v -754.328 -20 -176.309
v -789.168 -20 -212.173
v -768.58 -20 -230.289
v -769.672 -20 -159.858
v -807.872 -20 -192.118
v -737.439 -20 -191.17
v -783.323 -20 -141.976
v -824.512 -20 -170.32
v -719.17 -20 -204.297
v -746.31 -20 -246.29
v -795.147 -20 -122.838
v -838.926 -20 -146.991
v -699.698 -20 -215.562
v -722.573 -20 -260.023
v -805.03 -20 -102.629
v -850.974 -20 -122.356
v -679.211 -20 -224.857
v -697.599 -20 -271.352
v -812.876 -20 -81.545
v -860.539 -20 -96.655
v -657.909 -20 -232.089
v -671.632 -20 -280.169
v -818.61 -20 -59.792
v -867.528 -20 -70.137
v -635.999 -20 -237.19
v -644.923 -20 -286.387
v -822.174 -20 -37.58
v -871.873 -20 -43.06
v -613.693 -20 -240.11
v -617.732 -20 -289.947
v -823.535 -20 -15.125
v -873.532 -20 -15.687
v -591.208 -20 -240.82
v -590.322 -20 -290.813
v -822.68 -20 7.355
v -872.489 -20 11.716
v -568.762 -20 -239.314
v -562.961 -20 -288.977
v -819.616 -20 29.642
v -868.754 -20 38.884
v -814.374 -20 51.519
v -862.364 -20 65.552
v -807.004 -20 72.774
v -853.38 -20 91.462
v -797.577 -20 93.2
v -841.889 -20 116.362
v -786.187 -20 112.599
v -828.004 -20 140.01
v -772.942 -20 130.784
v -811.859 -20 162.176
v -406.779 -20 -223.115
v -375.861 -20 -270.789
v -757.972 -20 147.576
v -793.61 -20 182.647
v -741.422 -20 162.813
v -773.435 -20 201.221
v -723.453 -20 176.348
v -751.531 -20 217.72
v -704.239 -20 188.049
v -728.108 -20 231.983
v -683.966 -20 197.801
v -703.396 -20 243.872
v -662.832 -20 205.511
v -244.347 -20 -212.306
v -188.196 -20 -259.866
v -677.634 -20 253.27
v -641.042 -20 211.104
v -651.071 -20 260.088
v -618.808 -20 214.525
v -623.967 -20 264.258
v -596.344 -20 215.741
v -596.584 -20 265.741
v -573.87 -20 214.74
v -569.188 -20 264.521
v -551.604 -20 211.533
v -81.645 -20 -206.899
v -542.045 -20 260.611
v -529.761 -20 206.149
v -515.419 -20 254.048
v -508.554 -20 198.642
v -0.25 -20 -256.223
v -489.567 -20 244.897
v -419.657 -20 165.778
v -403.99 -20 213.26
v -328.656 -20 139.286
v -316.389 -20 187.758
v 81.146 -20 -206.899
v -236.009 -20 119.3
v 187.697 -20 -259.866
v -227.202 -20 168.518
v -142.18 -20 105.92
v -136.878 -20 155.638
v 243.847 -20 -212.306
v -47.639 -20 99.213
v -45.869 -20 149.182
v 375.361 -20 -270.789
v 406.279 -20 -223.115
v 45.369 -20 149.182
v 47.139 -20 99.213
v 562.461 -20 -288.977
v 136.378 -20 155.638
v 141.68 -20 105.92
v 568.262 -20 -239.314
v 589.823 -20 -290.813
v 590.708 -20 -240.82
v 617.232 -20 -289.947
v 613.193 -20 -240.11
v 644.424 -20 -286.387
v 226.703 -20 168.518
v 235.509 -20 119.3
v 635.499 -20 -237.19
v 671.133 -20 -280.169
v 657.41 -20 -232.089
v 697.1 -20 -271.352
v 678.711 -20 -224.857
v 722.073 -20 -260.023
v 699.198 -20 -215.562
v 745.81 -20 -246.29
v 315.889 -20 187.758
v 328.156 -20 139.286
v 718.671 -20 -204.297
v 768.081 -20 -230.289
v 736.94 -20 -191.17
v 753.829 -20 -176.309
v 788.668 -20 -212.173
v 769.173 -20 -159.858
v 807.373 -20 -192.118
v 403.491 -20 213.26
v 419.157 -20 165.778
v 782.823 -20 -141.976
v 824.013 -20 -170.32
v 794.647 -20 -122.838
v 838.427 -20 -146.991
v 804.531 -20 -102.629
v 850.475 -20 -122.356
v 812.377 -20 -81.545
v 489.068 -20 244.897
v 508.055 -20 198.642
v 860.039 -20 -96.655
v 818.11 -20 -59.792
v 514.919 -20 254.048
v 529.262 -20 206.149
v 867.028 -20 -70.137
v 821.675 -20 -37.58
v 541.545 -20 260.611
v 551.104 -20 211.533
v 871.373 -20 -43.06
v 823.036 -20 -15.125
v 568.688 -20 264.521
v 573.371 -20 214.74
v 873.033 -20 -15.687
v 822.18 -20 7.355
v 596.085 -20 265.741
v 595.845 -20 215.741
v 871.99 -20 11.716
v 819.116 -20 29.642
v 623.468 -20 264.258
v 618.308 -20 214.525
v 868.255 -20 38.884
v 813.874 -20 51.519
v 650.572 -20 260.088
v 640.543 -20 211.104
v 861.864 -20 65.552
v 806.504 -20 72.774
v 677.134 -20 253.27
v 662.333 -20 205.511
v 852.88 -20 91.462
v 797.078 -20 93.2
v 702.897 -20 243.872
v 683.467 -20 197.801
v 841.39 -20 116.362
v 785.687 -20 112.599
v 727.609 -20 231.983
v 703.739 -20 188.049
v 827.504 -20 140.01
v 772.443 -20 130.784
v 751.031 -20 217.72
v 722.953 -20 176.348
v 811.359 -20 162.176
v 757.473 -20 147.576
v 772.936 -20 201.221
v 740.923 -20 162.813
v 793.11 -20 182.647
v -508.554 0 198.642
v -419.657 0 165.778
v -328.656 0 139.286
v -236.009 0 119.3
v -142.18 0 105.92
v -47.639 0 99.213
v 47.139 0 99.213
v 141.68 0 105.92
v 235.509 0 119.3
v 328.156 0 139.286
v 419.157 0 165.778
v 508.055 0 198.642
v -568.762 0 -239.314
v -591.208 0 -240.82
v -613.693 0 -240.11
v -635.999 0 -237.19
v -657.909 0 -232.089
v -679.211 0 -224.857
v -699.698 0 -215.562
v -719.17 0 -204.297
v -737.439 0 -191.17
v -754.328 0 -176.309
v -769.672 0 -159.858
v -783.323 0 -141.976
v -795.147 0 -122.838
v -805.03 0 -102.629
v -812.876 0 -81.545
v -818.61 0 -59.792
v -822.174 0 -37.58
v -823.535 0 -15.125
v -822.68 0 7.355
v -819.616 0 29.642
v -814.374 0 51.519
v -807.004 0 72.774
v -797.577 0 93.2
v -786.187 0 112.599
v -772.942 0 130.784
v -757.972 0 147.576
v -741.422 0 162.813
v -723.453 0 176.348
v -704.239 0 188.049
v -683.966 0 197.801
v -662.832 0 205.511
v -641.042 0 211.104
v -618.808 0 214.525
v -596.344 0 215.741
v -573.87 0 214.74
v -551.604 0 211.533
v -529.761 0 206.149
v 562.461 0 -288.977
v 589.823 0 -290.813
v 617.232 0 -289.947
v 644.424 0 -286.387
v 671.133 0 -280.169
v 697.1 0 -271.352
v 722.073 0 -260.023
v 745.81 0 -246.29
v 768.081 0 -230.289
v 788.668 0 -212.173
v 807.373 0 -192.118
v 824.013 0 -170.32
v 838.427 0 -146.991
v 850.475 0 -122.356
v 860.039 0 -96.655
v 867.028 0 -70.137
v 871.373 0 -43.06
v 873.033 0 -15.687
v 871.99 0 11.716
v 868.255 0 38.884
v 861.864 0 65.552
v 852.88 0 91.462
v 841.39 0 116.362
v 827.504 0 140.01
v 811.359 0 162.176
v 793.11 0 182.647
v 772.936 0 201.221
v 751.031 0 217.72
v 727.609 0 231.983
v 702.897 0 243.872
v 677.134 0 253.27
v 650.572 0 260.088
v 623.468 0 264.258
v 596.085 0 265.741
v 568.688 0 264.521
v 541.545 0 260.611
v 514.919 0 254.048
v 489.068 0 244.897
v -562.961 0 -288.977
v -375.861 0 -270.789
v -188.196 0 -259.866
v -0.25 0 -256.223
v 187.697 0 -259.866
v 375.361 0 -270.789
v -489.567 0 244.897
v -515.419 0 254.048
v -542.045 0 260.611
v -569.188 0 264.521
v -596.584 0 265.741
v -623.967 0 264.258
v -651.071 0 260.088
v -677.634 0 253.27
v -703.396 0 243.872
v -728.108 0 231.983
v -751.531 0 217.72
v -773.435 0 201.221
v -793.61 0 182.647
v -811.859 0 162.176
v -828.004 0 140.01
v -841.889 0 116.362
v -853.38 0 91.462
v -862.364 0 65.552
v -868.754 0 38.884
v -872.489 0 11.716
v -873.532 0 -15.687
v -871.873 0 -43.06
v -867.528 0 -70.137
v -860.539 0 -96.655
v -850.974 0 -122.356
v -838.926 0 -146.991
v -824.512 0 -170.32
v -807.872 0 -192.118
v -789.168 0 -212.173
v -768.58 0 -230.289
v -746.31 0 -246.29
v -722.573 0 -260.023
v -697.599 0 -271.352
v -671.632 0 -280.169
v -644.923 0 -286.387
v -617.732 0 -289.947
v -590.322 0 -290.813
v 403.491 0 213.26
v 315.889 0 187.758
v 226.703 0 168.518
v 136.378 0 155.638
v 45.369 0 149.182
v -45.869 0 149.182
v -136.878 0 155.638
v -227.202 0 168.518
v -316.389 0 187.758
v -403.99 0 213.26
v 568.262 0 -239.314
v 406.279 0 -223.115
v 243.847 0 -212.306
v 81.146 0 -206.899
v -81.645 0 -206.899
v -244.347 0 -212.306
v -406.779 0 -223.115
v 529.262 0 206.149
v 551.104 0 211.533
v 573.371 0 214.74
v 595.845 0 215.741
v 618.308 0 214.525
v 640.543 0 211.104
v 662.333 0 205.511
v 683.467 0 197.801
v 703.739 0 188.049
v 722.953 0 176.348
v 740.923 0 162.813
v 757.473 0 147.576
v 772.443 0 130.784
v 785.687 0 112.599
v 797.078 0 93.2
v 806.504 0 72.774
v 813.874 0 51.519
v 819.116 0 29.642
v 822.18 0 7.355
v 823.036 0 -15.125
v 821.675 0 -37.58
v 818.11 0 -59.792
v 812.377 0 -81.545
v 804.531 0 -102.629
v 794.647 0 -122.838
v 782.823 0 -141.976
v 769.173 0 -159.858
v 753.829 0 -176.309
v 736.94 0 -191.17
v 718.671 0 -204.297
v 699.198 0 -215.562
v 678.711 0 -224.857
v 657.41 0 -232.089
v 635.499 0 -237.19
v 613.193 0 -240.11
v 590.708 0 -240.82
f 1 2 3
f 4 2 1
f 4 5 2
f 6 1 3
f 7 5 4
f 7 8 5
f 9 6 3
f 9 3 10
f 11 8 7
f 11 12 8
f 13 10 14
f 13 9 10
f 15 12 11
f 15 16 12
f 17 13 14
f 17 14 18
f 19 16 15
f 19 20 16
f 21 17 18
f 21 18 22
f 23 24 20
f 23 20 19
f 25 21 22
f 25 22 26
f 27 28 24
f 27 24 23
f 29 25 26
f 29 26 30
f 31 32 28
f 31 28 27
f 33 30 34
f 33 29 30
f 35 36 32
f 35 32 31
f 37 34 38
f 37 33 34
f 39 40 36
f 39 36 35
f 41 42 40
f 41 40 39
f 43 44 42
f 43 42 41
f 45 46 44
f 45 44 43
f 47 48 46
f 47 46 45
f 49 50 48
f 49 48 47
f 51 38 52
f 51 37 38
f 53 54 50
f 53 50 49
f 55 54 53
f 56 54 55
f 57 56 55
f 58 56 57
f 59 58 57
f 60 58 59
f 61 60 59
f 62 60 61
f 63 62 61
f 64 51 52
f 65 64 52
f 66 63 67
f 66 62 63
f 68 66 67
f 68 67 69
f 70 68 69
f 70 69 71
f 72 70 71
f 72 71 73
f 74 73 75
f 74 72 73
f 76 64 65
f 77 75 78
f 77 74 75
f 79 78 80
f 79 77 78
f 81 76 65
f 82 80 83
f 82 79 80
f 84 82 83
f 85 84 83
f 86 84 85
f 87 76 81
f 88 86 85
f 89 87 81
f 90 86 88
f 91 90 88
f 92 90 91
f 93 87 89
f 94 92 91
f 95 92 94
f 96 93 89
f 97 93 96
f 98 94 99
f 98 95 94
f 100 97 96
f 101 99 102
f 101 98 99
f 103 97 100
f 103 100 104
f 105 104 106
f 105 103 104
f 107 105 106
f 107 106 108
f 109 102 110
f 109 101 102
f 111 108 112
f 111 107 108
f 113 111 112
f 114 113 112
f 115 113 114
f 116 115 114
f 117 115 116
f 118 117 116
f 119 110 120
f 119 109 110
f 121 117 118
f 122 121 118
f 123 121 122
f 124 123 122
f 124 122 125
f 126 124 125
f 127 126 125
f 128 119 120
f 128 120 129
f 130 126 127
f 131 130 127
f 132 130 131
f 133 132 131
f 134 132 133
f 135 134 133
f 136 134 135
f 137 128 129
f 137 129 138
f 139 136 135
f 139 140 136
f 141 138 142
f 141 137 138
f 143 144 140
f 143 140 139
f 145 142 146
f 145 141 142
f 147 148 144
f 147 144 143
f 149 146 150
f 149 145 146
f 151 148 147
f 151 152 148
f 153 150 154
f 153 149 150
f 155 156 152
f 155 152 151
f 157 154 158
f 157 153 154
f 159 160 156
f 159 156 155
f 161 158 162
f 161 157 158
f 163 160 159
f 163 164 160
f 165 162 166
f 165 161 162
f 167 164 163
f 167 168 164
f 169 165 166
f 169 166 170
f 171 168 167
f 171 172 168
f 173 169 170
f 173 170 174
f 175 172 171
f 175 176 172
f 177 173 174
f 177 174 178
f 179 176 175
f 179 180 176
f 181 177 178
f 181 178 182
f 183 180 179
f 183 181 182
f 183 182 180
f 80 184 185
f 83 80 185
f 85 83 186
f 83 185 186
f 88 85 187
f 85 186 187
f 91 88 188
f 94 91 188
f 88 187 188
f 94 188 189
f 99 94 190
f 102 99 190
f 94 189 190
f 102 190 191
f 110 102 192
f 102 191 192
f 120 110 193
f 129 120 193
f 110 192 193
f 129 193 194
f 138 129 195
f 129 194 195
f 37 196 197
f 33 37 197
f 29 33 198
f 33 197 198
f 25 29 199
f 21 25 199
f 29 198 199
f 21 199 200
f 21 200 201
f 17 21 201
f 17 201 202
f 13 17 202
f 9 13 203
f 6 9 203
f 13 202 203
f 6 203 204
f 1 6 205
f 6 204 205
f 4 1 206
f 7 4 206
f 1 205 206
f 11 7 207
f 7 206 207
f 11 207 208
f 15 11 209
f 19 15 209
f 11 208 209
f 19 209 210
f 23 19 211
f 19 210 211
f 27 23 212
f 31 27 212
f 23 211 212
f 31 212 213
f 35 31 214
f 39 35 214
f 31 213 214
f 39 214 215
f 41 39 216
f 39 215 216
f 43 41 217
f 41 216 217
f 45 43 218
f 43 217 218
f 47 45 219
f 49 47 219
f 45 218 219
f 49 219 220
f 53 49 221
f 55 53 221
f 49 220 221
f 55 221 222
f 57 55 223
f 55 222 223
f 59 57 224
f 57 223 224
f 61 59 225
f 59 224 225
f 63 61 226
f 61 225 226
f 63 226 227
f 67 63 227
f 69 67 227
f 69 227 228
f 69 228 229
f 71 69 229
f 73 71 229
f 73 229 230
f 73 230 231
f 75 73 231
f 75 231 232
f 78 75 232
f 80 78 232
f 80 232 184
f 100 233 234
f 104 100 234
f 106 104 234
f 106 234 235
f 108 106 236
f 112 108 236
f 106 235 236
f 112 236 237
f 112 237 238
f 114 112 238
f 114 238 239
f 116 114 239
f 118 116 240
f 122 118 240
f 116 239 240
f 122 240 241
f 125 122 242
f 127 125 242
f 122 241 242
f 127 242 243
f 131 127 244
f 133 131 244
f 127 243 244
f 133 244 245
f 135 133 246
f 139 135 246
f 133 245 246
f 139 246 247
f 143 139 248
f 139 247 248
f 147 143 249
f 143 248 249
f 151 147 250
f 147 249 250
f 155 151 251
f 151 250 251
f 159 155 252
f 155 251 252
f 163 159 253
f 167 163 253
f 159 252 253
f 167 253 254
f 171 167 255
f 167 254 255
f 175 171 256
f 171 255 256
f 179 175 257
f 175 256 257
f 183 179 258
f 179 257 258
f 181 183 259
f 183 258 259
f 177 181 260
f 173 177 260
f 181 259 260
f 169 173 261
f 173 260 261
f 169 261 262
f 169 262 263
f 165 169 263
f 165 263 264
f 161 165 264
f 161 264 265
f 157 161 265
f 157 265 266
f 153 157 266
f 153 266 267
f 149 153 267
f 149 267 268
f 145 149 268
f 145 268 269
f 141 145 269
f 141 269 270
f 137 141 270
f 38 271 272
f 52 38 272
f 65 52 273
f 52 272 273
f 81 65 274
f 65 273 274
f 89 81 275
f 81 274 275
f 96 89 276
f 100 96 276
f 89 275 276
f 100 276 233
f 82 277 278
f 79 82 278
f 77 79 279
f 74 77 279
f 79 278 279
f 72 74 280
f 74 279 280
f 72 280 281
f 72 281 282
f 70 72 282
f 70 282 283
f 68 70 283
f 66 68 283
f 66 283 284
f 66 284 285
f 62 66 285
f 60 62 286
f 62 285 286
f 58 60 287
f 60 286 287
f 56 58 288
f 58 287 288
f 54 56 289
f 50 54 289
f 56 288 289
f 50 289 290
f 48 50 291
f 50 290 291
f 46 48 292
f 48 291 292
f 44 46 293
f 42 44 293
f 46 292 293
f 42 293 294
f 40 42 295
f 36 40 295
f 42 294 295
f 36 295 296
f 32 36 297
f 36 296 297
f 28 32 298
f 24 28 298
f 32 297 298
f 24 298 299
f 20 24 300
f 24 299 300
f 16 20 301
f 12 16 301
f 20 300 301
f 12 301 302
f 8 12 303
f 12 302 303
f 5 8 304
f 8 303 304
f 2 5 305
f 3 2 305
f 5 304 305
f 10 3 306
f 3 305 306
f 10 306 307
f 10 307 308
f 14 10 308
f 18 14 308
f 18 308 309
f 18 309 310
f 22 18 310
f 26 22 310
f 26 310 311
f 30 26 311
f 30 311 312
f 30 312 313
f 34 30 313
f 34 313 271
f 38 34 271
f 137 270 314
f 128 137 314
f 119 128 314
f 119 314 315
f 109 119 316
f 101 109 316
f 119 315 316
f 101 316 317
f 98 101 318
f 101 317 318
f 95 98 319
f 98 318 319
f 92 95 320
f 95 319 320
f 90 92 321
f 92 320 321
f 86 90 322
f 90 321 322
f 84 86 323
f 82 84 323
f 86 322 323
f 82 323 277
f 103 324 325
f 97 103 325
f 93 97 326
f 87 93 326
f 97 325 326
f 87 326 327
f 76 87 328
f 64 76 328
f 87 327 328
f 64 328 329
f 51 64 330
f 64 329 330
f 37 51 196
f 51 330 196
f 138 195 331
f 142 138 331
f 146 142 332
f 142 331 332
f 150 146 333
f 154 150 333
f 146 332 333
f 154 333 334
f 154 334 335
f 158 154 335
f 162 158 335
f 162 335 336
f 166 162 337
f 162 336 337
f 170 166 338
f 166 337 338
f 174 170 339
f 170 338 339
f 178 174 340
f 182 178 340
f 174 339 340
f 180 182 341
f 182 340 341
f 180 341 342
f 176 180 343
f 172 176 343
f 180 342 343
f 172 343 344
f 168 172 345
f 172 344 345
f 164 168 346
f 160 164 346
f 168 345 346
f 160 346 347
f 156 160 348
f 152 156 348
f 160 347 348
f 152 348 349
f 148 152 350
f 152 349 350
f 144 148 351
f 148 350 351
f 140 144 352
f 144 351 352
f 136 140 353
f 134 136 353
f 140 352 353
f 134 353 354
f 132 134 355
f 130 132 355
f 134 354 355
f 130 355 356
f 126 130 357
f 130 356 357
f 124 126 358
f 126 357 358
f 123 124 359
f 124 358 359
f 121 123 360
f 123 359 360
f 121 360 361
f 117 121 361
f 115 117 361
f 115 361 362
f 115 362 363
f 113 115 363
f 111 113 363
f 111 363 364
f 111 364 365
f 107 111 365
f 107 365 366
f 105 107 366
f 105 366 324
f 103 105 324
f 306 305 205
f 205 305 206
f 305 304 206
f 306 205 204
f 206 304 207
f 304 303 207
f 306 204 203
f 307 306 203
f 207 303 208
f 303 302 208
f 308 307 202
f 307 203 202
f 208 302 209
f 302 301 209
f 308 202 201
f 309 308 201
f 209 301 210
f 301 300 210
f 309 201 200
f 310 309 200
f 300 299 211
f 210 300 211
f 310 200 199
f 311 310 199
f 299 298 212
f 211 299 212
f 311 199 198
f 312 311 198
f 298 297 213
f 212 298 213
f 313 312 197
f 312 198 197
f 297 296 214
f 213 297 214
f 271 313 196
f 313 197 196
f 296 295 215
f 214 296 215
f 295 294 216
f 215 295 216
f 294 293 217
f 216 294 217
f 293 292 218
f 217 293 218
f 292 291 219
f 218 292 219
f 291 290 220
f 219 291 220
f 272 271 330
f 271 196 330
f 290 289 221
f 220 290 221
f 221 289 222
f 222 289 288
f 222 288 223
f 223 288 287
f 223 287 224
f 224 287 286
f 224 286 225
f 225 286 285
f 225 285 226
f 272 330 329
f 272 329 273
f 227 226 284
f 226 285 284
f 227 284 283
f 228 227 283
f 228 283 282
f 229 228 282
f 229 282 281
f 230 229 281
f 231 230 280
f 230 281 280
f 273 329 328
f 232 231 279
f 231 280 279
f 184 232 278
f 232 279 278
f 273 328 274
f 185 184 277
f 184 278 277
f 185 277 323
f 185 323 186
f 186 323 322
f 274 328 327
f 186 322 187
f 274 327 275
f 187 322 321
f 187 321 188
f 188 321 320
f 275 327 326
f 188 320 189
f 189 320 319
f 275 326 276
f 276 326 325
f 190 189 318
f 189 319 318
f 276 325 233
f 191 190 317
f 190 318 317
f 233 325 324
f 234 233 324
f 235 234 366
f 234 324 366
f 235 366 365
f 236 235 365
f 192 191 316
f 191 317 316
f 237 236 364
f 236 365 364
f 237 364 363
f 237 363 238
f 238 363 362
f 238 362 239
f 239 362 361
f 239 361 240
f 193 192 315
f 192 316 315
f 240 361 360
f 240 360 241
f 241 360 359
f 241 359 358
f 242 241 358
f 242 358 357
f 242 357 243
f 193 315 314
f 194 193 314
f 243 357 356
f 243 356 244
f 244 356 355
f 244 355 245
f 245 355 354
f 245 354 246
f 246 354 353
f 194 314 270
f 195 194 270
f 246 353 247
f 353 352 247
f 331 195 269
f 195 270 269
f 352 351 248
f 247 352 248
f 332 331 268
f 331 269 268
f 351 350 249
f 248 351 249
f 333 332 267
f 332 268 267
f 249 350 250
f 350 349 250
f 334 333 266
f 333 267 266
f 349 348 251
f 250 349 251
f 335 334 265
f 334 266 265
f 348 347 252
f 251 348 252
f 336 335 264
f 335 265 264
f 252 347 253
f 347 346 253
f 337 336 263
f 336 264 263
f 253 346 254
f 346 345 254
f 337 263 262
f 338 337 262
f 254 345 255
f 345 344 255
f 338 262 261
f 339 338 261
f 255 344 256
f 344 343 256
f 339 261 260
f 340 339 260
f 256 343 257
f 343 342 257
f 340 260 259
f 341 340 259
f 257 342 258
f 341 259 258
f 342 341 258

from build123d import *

# Parameters (mm, degrees)
F1_DEPTH = 20


with BuildPart() as f1:
    # F0 (on Front) → F1 (new body)
    with BuildSketch(Plane.XZ):
        with BuildLine():
            ThreePointArc((489.067735, 244.89684), (-0.249757, 148.374207), (-489.567249, 244.89684))
            ThreePointArc((-489.567249, 244.89684), (-870.956673, 25.346072), (-562.960597, -288.976771))
            ThreePointArc((-562.960597, -288.976771), (-0.249757, -256.22251), (562.461083, -288.976771))
            ThreePointArc((562.461083, -288.976771), (870.457159, 25.346072), (489.067735, 244.89684))
        make_face()
        with BuildLine():
            ThreePointArc((-568.76174, -239.314444), (-821.422552, 18.536454), (-508.554405, 198.642241))
            ThreePointArc((-508.554405, 198.642241), (-0.249757, 98.374207), (508.054891, 198.642241))
            ThreePointArc((508.054891, 198.642241), (820.923038, 18.536454), (568.262226, -239.314444))
            ThreePointArc((568.262226, -239.314444), (-0.249757, -206.22251), (-568.76174, -239.314444))
        make_face(mode=Mode.SUBTRACT)
    extrude(amount=F1_DEPTH)


solid = f1.part
